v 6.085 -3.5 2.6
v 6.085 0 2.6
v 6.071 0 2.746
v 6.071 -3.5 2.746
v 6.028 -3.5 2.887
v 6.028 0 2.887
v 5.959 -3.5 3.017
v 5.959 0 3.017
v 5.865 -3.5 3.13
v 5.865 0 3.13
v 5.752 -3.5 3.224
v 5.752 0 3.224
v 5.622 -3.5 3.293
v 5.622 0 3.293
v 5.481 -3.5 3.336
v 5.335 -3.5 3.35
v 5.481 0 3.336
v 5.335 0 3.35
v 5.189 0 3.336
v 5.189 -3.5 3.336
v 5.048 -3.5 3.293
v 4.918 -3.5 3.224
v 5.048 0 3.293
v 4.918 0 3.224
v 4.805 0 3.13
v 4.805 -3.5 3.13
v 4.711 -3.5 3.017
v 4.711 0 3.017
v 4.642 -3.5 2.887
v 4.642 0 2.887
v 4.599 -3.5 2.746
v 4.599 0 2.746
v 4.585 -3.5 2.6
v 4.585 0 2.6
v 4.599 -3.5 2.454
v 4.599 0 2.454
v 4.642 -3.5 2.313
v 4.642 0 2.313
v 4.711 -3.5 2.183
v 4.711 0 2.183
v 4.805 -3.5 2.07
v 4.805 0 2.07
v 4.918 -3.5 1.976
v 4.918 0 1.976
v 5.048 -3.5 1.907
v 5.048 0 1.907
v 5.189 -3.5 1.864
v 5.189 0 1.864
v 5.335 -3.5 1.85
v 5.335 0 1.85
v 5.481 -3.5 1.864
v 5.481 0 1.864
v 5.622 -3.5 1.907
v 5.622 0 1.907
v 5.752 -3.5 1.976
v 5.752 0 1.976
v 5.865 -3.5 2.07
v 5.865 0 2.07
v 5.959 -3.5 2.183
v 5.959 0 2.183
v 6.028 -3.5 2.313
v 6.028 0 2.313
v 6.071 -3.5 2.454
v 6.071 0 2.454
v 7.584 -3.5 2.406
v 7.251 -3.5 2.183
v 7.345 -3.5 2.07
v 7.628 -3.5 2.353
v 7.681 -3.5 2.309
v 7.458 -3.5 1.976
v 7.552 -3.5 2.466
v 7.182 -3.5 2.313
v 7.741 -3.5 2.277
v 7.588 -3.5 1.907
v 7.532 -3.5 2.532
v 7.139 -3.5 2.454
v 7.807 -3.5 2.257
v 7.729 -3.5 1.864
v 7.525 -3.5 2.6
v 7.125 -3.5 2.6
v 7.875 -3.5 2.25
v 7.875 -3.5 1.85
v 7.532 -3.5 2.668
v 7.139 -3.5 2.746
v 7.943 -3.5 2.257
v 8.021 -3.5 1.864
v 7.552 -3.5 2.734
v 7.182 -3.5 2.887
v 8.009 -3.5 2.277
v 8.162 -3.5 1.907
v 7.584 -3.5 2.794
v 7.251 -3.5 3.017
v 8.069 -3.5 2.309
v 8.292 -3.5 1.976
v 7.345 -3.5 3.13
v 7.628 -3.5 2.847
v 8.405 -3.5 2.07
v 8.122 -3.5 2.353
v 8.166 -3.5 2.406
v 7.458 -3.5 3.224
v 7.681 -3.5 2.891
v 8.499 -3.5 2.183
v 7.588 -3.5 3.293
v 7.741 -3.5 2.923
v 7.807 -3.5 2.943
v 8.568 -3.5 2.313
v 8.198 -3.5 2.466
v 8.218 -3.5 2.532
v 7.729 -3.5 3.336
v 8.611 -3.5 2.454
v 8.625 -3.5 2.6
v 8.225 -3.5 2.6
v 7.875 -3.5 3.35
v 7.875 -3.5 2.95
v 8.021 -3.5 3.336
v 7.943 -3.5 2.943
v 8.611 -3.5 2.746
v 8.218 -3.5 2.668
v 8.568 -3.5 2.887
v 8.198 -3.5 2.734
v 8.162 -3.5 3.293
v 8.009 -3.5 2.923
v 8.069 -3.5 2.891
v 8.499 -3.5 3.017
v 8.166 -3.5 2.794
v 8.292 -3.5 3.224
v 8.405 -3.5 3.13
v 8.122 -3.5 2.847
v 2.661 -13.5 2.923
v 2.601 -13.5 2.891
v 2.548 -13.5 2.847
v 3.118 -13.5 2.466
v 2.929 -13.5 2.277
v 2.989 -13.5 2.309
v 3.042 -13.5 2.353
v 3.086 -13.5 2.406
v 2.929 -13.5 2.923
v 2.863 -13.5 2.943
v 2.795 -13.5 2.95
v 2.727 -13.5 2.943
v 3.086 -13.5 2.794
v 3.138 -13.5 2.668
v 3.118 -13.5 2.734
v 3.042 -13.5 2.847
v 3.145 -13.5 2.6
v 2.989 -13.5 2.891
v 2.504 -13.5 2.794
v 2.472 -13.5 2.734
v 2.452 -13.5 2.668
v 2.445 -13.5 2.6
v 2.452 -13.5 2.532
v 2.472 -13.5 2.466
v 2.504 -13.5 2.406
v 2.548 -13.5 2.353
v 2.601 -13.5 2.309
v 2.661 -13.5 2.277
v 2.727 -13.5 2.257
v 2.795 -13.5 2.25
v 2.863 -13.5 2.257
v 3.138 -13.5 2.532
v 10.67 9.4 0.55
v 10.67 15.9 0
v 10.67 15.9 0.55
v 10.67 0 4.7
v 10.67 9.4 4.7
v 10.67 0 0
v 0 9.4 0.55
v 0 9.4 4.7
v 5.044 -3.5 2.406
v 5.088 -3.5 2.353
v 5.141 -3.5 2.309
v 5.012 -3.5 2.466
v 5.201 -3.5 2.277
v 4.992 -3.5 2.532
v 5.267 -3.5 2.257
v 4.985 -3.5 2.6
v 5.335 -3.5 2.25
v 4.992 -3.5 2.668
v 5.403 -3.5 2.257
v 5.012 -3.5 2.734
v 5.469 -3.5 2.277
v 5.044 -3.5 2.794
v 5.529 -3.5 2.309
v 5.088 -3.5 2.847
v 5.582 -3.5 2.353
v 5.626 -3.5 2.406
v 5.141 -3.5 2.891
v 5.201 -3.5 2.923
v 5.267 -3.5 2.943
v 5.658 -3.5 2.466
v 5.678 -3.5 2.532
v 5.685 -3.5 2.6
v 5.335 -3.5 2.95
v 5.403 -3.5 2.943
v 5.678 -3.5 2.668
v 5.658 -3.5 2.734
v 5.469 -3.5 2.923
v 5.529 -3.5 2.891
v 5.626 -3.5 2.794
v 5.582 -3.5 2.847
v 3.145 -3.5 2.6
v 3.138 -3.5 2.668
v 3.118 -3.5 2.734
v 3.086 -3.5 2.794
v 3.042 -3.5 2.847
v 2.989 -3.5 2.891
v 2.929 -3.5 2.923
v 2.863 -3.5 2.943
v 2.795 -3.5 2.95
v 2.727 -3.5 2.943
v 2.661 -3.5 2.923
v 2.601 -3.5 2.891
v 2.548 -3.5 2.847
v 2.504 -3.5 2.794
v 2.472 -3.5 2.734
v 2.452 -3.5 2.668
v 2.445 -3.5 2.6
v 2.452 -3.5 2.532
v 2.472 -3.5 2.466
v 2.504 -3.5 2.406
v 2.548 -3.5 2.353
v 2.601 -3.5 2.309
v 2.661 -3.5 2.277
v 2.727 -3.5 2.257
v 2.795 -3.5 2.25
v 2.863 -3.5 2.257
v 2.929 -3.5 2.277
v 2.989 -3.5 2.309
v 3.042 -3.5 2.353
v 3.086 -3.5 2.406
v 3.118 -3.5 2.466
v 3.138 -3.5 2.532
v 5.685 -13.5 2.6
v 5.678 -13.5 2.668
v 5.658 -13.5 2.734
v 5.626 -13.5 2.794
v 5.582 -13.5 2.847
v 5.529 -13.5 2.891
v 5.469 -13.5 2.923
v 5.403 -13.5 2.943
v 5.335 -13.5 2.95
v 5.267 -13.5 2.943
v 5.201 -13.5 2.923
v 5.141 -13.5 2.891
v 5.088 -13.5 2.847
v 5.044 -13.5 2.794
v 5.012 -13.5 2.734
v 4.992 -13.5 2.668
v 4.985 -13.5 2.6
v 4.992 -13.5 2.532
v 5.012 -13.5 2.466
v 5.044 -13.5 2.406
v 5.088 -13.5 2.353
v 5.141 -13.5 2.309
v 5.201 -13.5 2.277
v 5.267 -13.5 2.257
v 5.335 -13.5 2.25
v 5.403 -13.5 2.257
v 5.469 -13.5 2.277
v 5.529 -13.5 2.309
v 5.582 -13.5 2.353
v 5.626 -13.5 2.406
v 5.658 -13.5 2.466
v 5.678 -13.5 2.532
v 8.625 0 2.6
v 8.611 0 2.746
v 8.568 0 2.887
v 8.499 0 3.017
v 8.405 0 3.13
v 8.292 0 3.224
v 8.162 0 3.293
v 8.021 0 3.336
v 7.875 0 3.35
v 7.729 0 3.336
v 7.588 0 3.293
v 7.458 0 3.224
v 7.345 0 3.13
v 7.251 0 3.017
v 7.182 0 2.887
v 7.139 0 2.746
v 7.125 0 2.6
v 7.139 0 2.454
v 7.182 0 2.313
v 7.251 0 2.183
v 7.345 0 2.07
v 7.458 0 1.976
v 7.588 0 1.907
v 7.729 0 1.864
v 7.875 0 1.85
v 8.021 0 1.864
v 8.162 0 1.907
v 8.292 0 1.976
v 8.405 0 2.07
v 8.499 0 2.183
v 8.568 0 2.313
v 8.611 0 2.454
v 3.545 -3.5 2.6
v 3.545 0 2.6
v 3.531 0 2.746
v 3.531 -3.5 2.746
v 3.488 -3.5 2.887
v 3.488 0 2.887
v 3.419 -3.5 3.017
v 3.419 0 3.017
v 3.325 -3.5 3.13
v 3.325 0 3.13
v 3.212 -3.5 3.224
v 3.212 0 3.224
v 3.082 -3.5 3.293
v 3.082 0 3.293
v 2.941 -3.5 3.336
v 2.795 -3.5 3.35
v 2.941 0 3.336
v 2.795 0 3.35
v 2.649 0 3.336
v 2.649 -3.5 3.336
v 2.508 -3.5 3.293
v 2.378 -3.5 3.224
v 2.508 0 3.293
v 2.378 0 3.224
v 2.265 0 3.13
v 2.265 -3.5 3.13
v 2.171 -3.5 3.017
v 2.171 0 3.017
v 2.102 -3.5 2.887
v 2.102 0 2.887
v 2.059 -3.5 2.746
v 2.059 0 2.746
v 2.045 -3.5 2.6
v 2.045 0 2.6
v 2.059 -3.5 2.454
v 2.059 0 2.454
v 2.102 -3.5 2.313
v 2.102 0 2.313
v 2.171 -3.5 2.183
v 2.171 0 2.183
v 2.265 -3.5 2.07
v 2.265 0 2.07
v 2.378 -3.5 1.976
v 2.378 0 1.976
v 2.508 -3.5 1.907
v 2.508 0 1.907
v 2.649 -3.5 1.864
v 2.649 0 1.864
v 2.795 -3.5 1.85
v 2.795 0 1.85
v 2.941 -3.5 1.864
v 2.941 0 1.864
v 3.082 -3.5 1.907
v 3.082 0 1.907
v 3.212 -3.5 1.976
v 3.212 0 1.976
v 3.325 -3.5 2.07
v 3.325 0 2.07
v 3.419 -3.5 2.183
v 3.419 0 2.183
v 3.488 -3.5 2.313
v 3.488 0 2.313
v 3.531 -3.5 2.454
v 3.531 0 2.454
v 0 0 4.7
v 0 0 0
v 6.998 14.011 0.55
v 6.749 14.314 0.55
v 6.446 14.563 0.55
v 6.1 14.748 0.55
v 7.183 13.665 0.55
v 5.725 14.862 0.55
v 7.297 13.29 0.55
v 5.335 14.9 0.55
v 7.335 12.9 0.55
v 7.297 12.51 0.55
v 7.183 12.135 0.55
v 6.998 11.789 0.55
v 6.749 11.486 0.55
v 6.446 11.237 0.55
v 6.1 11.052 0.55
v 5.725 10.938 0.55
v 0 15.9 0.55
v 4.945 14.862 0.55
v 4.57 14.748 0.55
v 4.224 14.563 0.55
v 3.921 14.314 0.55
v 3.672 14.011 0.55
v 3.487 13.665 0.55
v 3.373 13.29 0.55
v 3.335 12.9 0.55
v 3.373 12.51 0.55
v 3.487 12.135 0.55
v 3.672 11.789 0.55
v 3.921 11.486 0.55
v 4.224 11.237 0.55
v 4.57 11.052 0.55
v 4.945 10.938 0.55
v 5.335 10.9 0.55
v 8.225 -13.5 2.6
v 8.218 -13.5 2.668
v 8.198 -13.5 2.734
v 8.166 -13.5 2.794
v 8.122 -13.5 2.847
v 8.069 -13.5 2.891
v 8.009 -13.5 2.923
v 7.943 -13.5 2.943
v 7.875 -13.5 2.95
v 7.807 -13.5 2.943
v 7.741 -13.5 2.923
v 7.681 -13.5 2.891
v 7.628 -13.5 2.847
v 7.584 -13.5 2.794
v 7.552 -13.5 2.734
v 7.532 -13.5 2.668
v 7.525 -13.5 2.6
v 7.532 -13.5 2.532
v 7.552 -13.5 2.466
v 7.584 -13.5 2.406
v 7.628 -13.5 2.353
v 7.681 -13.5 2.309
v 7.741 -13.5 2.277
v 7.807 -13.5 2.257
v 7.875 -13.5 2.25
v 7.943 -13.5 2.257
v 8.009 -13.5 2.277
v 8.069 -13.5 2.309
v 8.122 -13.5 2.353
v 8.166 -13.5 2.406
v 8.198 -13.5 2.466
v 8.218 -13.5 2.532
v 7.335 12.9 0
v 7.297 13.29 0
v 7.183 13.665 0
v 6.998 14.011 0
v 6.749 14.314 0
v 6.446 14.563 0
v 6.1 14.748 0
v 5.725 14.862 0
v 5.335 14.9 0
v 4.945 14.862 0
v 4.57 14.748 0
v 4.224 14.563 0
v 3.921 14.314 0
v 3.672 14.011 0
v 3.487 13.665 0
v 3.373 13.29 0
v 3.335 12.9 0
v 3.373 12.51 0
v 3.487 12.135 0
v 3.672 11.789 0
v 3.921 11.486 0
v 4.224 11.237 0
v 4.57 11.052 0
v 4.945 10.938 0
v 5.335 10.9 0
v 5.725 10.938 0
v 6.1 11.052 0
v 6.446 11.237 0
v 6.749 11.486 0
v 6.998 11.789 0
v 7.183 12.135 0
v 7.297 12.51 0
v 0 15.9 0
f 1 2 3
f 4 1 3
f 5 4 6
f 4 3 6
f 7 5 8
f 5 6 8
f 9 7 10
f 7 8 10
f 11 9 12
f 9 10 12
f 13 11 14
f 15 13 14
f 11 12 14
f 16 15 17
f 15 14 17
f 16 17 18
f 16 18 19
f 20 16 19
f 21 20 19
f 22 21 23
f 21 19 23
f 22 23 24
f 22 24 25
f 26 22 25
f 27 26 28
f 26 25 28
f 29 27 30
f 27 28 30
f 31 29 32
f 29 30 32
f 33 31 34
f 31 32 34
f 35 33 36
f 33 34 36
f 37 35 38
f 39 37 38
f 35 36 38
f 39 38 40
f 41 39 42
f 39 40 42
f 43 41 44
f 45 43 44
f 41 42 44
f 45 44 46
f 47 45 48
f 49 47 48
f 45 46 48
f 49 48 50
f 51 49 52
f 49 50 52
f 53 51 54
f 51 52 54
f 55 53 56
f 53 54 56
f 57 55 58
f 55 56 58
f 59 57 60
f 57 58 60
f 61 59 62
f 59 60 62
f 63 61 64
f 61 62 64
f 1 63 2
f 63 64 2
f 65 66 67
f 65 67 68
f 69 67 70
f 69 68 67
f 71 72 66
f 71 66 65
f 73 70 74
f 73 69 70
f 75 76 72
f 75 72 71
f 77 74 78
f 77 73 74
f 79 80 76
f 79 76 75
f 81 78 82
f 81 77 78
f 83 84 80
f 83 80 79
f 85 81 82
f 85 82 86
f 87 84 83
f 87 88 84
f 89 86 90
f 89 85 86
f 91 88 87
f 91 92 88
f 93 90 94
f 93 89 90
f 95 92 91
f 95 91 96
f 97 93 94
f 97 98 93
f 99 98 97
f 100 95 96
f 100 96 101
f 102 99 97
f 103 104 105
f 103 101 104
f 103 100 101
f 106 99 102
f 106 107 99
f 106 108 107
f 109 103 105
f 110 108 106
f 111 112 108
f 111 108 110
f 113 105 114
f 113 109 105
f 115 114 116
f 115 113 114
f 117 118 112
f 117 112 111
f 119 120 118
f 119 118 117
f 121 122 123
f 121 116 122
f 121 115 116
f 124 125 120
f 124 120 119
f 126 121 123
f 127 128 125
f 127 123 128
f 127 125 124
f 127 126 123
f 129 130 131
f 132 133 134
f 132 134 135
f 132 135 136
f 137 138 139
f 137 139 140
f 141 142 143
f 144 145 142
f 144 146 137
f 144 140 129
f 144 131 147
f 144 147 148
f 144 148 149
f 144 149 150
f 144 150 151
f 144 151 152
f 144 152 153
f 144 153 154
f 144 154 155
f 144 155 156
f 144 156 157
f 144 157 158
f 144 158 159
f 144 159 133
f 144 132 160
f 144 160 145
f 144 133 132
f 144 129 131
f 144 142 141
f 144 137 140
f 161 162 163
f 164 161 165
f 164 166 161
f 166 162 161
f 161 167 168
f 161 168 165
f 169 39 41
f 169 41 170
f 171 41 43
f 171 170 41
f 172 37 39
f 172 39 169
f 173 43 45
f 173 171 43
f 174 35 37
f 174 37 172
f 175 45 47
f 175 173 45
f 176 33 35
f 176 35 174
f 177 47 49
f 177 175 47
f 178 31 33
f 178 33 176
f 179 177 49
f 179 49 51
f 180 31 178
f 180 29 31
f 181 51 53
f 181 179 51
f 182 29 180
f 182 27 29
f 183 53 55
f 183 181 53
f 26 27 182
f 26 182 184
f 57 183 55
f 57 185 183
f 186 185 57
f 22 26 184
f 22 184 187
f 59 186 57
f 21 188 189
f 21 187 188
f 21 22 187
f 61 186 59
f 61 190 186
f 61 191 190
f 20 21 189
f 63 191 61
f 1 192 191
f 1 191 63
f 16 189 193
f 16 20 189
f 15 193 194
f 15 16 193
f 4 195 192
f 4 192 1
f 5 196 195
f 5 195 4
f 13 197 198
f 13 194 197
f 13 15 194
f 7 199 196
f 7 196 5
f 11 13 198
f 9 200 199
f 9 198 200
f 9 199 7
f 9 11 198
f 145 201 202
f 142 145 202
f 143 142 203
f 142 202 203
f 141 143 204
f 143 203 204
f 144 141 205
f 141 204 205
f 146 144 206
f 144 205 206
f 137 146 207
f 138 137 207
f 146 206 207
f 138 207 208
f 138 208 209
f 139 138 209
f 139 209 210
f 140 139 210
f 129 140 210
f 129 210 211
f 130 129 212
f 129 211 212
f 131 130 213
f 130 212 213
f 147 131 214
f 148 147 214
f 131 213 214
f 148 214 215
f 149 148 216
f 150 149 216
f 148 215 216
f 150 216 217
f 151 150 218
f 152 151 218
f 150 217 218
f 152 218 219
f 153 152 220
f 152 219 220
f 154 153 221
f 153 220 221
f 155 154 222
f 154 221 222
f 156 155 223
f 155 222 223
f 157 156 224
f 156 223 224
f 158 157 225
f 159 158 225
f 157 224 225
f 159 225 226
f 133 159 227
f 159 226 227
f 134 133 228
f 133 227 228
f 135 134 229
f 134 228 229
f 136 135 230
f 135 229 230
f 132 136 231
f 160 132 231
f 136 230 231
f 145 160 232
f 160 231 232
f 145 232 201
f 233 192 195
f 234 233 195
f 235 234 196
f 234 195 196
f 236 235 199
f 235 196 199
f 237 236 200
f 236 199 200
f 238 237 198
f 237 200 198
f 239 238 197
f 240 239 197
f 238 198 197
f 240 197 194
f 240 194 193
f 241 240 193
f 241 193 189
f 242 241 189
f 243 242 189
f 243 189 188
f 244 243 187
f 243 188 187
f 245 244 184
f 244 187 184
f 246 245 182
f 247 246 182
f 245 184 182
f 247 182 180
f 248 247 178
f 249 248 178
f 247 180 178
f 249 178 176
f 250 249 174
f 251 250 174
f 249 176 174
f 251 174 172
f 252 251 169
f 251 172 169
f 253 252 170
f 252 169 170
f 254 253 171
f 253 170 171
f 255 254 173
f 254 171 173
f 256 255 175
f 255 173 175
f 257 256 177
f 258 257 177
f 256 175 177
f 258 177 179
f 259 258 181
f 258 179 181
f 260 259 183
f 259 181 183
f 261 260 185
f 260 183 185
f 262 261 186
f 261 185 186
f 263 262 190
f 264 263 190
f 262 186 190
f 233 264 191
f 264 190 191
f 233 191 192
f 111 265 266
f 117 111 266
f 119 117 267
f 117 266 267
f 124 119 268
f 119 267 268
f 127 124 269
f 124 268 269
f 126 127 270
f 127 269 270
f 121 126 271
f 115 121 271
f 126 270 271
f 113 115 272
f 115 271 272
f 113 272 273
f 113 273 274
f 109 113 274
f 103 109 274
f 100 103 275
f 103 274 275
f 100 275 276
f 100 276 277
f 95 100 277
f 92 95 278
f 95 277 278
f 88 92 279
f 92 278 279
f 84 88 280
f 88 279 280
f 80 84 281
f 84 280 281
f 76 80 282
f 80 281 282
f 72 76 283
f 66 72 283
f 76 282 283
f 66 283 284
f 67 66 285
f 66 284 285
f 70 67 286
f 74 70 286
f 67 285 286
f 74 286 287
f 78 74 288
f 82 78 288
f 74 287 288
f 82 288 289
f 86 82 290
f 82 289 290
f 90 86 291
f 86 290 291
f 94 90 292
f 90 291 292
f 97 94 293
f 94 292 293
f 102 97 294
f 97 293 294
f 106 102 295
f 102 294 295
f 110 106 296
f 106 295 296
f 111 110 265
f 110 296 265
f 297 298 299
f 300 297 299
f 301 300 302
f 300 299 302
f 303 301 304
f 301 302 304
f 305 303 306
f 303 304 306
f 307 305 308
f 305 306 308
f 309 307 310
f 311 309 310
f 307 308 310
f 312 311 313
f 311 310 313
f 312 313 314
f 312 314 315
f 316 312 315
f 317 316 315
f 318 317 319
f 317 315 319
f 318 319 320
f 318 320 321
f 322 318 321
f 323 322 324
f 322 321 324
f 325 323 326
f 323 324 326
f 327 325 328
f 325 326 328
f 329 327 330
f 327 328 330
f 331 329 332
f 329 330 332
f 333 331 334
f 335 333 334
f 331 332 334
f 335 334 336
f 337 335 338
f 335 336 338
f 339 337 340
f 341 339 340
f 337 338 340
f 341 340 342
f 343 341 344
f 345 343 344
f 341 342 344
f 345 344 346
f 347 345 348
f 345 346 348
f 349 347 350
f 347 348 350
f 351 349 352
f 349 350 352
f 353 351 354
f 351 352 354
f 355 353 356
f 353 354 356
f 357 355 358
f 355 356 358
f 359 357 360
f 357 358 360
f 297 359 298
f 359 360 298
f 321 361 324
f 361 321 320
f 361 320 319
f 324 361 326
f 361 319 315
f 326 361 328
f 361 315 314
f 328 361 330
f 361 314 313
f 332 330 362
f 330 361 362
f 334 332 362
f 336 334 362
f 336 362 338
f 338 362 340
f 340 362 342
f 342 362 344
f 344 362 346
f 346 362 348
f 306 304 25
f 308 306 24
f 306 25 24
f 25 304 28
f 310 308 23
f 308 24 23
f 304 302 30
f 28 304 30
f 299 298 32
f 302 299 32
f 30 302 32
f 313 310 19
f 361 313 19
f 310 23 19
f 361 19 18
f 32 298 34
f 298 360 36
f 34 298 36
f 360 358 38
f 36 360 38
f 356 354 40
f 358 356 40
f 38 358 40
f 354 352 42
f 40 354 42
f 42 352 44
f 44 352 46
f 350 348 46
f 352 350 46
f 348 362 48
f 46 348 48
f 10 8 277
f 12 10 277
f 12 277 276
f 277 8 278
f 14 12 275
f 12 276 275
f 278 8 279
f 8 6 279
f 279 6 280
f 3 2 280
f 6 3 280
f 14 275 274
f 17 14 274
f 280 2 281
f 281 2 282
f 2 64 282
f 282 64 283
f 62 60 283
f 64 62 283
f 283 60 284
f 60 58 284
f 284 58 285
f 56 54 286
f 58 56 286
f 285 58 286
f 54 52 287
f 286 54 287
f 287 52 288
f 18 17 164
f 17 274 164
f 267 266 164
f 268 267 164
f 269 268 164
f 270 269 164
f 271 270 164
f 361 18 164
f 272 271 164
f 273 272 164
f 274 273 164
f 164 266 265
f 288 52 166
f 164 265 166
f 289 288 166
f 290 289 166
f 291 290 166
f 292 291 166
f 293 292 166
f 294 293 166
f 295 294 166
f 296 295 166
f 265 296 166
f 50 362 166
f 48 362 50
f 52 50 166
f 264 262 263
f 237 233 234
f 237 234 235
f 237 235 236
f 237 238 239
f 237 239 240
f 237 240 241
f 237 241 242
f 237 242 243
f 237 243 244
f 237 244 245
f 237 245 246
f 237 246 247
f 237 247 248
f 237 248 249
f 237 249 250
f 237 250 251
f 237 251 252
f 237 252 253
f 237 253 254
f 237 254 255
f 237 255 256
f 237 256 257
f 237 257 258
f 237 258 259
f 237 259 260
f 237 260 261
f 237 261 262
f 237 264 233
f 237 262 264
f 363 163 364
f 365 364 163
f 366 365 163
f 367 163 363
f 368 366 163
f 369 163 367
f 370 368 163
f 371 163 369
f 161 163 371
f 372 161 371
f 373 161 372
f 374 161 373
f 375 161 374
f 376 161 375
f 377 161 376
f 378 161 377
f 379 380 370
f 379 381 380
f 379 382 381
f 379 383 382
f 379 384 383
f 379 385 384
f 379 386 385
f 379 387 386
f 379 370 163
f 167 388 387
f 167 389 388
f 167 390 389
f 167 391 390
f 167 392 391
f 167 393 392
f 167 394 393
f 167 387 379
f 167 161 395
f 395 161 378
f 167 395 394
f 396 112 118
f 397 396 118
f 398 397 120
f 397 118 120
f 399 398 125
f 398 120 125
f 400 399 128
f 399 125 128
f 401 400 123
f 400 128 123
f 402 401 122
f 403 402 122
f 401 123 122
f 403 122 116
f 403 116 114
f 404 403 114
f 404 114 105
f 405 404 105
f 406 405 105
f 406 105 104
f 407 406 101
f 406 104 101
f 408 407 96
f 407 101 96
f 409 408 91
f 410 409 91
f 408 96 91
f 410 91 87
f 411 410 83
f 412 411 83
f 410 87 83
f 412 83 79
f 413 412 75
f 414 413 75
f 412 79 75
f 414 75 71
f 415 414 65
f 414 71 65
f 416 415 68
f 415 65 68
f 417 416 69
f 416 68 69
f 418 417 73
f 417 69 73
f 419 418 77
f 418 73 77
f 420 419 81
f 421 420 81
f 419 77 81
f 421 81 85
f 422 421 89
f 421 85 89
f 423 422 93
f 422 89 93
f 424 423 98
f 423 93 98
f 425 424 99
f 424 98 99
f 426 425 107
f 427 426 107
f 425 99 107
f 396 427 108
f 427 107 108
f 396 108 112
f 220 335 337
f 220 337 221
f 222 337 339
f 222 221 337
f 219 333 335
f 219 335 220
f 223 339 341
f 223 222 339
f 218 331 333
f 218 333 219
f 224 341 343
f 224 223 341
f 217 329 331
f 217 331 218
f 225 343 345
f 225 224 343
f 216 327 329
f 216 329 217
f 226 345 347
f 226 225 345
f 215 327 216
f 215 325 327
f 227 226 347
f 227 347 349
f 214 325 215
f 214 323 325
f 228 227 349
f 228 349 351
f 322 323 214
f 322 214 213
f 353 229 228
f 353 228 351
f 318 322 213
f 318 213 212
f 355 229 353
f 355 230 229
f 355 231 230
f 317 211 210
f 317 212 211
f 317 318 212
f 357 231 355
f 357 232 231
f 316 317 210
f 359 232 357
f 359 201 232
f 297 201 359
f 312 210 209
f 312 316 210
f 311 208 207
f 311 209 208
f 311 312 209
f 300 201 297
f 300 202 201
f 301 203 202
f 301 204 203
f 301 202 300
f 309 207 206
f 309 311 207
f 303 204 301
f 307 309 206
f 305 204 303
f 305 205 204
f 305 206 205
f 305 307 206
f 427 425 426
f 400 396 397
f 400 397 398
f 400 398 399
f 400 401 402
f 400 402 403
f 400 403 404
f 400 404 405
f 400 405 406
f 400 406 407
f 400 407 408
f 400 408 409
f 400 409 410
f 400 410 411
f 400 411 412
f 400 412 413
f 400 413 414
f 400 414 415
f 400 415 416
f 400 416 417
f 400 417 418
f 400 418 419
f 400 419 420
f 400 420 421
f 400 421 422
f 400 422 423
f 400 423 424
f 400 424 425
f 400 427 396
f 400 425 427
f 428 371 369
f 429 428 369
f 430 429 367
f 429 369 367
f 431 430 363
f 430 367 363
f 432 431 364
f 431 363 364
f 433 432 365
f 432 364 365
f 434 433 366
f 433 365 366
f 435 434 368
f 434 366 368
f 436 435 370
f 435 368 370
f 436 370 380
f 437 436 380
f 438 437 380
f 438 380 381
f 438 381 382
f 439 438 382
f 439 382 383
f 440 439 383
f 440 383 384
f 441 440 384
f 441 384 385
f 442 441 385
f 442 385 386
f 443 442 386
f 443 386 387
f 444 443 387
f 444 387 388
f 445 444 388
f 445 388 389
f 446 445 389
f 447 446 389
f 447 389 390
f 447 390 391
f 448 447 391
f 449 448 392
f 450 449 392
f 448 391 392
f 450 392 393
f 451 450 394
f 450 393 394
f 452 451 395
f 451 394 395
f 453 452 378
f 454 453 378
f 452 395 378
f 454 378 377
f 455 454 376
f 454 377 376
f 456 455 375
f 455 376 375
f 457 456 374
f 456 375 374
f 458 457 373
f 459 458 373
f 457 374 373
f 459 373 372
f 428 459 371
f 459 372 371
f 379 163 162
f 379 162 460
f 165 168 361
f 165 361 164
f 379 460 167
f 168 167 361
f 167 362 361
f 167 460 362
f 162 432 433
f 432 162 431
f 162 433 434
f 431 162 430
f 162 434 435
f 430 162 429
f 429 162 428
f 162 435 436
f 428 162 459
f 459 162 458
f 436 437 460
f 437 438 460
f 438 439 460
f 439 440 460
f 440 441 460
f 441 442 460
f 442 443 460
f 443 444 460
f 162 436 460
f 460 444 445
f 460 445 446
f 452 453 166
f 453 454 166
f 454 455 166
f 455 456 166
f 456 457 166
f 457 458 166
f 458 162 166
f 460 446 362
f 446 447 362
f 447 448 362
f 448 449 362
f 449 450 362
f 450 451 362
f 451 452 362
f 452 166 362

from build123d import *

# Parameters (mm, degrees)
SKETCH_W     = 10.67
SKETCH_H     = 9.4
PAD_DEPTH    = 4.7
SKETCH001_R  = 0.75
PAD001_DEPTH = 3.5
SKETCH002_R  = 0.35
PAD002_DEPTH = 10
SKETCH003_W  = 10.67
SKETCH003_H  = 0.55
PAD003_DEPTH = 6.5
SKETCH004_R  = 2
POCKET_DEPTH = 5


with BuildPart() as part:
    # Sketch → Pad (new body)
    with BuildSketch(Plane.XY):
        with Locations((5.335, 4.7)):
            Rectangle(SKETCH_W, SKETCH_H)
    extrude(amount=PAD_DEPTH)

    # Sketch001 → Pad001 (new body)
    with BuildSketch(Plane.XZ):
        with Locations((2.795, 2.6)):
            Circle(SKETCH001_R)
        with Locations((5.335, 2.6)):
            Circle(SKETCH001_R)
        with Locations((7.875, 2.6)):
            Circle(SKETCH001_R)
    extrude(amount=PAD001_DEPTH)

    # Sketch002 → Pad002 (new body)
    with BuildSketch(Plane.XZ.offset(3.5)):
        with Locations((2.795, 2.6)):
            Circle(SKETCH002_R)
        with Locations((5.335, 2.6)):
            Circle(SKETCH002_R)
        with Locations((7.875, 2.6)):
            Circle(SKETCH002_R)
    extrude(amount=PAD002_DEPTH)

    # Sketch003 → Pad003 (new body)
    with BuildSketch(Plane(origin=(0, 9.4, 0), x_dir=(-1, 0, 0), z_dir=(0, 1, 0))):
        with Locations((-5.335, 0.275)):
            Rectangle(SKETCH003_W, SKETCH003_H)
    extrude(amount=PAD003_DEPTH)

    # Sketch004 → Pocket (cut)
    with BuildSketch(Plane.XY.offset(0.55)):
        with Locations((5.335, 12.9)):
            Circle(SKETCH004_R)
    extrude(amount=-POCKET_DEPTH, mode=Mode.SUBTRACT)


solid = part.part
